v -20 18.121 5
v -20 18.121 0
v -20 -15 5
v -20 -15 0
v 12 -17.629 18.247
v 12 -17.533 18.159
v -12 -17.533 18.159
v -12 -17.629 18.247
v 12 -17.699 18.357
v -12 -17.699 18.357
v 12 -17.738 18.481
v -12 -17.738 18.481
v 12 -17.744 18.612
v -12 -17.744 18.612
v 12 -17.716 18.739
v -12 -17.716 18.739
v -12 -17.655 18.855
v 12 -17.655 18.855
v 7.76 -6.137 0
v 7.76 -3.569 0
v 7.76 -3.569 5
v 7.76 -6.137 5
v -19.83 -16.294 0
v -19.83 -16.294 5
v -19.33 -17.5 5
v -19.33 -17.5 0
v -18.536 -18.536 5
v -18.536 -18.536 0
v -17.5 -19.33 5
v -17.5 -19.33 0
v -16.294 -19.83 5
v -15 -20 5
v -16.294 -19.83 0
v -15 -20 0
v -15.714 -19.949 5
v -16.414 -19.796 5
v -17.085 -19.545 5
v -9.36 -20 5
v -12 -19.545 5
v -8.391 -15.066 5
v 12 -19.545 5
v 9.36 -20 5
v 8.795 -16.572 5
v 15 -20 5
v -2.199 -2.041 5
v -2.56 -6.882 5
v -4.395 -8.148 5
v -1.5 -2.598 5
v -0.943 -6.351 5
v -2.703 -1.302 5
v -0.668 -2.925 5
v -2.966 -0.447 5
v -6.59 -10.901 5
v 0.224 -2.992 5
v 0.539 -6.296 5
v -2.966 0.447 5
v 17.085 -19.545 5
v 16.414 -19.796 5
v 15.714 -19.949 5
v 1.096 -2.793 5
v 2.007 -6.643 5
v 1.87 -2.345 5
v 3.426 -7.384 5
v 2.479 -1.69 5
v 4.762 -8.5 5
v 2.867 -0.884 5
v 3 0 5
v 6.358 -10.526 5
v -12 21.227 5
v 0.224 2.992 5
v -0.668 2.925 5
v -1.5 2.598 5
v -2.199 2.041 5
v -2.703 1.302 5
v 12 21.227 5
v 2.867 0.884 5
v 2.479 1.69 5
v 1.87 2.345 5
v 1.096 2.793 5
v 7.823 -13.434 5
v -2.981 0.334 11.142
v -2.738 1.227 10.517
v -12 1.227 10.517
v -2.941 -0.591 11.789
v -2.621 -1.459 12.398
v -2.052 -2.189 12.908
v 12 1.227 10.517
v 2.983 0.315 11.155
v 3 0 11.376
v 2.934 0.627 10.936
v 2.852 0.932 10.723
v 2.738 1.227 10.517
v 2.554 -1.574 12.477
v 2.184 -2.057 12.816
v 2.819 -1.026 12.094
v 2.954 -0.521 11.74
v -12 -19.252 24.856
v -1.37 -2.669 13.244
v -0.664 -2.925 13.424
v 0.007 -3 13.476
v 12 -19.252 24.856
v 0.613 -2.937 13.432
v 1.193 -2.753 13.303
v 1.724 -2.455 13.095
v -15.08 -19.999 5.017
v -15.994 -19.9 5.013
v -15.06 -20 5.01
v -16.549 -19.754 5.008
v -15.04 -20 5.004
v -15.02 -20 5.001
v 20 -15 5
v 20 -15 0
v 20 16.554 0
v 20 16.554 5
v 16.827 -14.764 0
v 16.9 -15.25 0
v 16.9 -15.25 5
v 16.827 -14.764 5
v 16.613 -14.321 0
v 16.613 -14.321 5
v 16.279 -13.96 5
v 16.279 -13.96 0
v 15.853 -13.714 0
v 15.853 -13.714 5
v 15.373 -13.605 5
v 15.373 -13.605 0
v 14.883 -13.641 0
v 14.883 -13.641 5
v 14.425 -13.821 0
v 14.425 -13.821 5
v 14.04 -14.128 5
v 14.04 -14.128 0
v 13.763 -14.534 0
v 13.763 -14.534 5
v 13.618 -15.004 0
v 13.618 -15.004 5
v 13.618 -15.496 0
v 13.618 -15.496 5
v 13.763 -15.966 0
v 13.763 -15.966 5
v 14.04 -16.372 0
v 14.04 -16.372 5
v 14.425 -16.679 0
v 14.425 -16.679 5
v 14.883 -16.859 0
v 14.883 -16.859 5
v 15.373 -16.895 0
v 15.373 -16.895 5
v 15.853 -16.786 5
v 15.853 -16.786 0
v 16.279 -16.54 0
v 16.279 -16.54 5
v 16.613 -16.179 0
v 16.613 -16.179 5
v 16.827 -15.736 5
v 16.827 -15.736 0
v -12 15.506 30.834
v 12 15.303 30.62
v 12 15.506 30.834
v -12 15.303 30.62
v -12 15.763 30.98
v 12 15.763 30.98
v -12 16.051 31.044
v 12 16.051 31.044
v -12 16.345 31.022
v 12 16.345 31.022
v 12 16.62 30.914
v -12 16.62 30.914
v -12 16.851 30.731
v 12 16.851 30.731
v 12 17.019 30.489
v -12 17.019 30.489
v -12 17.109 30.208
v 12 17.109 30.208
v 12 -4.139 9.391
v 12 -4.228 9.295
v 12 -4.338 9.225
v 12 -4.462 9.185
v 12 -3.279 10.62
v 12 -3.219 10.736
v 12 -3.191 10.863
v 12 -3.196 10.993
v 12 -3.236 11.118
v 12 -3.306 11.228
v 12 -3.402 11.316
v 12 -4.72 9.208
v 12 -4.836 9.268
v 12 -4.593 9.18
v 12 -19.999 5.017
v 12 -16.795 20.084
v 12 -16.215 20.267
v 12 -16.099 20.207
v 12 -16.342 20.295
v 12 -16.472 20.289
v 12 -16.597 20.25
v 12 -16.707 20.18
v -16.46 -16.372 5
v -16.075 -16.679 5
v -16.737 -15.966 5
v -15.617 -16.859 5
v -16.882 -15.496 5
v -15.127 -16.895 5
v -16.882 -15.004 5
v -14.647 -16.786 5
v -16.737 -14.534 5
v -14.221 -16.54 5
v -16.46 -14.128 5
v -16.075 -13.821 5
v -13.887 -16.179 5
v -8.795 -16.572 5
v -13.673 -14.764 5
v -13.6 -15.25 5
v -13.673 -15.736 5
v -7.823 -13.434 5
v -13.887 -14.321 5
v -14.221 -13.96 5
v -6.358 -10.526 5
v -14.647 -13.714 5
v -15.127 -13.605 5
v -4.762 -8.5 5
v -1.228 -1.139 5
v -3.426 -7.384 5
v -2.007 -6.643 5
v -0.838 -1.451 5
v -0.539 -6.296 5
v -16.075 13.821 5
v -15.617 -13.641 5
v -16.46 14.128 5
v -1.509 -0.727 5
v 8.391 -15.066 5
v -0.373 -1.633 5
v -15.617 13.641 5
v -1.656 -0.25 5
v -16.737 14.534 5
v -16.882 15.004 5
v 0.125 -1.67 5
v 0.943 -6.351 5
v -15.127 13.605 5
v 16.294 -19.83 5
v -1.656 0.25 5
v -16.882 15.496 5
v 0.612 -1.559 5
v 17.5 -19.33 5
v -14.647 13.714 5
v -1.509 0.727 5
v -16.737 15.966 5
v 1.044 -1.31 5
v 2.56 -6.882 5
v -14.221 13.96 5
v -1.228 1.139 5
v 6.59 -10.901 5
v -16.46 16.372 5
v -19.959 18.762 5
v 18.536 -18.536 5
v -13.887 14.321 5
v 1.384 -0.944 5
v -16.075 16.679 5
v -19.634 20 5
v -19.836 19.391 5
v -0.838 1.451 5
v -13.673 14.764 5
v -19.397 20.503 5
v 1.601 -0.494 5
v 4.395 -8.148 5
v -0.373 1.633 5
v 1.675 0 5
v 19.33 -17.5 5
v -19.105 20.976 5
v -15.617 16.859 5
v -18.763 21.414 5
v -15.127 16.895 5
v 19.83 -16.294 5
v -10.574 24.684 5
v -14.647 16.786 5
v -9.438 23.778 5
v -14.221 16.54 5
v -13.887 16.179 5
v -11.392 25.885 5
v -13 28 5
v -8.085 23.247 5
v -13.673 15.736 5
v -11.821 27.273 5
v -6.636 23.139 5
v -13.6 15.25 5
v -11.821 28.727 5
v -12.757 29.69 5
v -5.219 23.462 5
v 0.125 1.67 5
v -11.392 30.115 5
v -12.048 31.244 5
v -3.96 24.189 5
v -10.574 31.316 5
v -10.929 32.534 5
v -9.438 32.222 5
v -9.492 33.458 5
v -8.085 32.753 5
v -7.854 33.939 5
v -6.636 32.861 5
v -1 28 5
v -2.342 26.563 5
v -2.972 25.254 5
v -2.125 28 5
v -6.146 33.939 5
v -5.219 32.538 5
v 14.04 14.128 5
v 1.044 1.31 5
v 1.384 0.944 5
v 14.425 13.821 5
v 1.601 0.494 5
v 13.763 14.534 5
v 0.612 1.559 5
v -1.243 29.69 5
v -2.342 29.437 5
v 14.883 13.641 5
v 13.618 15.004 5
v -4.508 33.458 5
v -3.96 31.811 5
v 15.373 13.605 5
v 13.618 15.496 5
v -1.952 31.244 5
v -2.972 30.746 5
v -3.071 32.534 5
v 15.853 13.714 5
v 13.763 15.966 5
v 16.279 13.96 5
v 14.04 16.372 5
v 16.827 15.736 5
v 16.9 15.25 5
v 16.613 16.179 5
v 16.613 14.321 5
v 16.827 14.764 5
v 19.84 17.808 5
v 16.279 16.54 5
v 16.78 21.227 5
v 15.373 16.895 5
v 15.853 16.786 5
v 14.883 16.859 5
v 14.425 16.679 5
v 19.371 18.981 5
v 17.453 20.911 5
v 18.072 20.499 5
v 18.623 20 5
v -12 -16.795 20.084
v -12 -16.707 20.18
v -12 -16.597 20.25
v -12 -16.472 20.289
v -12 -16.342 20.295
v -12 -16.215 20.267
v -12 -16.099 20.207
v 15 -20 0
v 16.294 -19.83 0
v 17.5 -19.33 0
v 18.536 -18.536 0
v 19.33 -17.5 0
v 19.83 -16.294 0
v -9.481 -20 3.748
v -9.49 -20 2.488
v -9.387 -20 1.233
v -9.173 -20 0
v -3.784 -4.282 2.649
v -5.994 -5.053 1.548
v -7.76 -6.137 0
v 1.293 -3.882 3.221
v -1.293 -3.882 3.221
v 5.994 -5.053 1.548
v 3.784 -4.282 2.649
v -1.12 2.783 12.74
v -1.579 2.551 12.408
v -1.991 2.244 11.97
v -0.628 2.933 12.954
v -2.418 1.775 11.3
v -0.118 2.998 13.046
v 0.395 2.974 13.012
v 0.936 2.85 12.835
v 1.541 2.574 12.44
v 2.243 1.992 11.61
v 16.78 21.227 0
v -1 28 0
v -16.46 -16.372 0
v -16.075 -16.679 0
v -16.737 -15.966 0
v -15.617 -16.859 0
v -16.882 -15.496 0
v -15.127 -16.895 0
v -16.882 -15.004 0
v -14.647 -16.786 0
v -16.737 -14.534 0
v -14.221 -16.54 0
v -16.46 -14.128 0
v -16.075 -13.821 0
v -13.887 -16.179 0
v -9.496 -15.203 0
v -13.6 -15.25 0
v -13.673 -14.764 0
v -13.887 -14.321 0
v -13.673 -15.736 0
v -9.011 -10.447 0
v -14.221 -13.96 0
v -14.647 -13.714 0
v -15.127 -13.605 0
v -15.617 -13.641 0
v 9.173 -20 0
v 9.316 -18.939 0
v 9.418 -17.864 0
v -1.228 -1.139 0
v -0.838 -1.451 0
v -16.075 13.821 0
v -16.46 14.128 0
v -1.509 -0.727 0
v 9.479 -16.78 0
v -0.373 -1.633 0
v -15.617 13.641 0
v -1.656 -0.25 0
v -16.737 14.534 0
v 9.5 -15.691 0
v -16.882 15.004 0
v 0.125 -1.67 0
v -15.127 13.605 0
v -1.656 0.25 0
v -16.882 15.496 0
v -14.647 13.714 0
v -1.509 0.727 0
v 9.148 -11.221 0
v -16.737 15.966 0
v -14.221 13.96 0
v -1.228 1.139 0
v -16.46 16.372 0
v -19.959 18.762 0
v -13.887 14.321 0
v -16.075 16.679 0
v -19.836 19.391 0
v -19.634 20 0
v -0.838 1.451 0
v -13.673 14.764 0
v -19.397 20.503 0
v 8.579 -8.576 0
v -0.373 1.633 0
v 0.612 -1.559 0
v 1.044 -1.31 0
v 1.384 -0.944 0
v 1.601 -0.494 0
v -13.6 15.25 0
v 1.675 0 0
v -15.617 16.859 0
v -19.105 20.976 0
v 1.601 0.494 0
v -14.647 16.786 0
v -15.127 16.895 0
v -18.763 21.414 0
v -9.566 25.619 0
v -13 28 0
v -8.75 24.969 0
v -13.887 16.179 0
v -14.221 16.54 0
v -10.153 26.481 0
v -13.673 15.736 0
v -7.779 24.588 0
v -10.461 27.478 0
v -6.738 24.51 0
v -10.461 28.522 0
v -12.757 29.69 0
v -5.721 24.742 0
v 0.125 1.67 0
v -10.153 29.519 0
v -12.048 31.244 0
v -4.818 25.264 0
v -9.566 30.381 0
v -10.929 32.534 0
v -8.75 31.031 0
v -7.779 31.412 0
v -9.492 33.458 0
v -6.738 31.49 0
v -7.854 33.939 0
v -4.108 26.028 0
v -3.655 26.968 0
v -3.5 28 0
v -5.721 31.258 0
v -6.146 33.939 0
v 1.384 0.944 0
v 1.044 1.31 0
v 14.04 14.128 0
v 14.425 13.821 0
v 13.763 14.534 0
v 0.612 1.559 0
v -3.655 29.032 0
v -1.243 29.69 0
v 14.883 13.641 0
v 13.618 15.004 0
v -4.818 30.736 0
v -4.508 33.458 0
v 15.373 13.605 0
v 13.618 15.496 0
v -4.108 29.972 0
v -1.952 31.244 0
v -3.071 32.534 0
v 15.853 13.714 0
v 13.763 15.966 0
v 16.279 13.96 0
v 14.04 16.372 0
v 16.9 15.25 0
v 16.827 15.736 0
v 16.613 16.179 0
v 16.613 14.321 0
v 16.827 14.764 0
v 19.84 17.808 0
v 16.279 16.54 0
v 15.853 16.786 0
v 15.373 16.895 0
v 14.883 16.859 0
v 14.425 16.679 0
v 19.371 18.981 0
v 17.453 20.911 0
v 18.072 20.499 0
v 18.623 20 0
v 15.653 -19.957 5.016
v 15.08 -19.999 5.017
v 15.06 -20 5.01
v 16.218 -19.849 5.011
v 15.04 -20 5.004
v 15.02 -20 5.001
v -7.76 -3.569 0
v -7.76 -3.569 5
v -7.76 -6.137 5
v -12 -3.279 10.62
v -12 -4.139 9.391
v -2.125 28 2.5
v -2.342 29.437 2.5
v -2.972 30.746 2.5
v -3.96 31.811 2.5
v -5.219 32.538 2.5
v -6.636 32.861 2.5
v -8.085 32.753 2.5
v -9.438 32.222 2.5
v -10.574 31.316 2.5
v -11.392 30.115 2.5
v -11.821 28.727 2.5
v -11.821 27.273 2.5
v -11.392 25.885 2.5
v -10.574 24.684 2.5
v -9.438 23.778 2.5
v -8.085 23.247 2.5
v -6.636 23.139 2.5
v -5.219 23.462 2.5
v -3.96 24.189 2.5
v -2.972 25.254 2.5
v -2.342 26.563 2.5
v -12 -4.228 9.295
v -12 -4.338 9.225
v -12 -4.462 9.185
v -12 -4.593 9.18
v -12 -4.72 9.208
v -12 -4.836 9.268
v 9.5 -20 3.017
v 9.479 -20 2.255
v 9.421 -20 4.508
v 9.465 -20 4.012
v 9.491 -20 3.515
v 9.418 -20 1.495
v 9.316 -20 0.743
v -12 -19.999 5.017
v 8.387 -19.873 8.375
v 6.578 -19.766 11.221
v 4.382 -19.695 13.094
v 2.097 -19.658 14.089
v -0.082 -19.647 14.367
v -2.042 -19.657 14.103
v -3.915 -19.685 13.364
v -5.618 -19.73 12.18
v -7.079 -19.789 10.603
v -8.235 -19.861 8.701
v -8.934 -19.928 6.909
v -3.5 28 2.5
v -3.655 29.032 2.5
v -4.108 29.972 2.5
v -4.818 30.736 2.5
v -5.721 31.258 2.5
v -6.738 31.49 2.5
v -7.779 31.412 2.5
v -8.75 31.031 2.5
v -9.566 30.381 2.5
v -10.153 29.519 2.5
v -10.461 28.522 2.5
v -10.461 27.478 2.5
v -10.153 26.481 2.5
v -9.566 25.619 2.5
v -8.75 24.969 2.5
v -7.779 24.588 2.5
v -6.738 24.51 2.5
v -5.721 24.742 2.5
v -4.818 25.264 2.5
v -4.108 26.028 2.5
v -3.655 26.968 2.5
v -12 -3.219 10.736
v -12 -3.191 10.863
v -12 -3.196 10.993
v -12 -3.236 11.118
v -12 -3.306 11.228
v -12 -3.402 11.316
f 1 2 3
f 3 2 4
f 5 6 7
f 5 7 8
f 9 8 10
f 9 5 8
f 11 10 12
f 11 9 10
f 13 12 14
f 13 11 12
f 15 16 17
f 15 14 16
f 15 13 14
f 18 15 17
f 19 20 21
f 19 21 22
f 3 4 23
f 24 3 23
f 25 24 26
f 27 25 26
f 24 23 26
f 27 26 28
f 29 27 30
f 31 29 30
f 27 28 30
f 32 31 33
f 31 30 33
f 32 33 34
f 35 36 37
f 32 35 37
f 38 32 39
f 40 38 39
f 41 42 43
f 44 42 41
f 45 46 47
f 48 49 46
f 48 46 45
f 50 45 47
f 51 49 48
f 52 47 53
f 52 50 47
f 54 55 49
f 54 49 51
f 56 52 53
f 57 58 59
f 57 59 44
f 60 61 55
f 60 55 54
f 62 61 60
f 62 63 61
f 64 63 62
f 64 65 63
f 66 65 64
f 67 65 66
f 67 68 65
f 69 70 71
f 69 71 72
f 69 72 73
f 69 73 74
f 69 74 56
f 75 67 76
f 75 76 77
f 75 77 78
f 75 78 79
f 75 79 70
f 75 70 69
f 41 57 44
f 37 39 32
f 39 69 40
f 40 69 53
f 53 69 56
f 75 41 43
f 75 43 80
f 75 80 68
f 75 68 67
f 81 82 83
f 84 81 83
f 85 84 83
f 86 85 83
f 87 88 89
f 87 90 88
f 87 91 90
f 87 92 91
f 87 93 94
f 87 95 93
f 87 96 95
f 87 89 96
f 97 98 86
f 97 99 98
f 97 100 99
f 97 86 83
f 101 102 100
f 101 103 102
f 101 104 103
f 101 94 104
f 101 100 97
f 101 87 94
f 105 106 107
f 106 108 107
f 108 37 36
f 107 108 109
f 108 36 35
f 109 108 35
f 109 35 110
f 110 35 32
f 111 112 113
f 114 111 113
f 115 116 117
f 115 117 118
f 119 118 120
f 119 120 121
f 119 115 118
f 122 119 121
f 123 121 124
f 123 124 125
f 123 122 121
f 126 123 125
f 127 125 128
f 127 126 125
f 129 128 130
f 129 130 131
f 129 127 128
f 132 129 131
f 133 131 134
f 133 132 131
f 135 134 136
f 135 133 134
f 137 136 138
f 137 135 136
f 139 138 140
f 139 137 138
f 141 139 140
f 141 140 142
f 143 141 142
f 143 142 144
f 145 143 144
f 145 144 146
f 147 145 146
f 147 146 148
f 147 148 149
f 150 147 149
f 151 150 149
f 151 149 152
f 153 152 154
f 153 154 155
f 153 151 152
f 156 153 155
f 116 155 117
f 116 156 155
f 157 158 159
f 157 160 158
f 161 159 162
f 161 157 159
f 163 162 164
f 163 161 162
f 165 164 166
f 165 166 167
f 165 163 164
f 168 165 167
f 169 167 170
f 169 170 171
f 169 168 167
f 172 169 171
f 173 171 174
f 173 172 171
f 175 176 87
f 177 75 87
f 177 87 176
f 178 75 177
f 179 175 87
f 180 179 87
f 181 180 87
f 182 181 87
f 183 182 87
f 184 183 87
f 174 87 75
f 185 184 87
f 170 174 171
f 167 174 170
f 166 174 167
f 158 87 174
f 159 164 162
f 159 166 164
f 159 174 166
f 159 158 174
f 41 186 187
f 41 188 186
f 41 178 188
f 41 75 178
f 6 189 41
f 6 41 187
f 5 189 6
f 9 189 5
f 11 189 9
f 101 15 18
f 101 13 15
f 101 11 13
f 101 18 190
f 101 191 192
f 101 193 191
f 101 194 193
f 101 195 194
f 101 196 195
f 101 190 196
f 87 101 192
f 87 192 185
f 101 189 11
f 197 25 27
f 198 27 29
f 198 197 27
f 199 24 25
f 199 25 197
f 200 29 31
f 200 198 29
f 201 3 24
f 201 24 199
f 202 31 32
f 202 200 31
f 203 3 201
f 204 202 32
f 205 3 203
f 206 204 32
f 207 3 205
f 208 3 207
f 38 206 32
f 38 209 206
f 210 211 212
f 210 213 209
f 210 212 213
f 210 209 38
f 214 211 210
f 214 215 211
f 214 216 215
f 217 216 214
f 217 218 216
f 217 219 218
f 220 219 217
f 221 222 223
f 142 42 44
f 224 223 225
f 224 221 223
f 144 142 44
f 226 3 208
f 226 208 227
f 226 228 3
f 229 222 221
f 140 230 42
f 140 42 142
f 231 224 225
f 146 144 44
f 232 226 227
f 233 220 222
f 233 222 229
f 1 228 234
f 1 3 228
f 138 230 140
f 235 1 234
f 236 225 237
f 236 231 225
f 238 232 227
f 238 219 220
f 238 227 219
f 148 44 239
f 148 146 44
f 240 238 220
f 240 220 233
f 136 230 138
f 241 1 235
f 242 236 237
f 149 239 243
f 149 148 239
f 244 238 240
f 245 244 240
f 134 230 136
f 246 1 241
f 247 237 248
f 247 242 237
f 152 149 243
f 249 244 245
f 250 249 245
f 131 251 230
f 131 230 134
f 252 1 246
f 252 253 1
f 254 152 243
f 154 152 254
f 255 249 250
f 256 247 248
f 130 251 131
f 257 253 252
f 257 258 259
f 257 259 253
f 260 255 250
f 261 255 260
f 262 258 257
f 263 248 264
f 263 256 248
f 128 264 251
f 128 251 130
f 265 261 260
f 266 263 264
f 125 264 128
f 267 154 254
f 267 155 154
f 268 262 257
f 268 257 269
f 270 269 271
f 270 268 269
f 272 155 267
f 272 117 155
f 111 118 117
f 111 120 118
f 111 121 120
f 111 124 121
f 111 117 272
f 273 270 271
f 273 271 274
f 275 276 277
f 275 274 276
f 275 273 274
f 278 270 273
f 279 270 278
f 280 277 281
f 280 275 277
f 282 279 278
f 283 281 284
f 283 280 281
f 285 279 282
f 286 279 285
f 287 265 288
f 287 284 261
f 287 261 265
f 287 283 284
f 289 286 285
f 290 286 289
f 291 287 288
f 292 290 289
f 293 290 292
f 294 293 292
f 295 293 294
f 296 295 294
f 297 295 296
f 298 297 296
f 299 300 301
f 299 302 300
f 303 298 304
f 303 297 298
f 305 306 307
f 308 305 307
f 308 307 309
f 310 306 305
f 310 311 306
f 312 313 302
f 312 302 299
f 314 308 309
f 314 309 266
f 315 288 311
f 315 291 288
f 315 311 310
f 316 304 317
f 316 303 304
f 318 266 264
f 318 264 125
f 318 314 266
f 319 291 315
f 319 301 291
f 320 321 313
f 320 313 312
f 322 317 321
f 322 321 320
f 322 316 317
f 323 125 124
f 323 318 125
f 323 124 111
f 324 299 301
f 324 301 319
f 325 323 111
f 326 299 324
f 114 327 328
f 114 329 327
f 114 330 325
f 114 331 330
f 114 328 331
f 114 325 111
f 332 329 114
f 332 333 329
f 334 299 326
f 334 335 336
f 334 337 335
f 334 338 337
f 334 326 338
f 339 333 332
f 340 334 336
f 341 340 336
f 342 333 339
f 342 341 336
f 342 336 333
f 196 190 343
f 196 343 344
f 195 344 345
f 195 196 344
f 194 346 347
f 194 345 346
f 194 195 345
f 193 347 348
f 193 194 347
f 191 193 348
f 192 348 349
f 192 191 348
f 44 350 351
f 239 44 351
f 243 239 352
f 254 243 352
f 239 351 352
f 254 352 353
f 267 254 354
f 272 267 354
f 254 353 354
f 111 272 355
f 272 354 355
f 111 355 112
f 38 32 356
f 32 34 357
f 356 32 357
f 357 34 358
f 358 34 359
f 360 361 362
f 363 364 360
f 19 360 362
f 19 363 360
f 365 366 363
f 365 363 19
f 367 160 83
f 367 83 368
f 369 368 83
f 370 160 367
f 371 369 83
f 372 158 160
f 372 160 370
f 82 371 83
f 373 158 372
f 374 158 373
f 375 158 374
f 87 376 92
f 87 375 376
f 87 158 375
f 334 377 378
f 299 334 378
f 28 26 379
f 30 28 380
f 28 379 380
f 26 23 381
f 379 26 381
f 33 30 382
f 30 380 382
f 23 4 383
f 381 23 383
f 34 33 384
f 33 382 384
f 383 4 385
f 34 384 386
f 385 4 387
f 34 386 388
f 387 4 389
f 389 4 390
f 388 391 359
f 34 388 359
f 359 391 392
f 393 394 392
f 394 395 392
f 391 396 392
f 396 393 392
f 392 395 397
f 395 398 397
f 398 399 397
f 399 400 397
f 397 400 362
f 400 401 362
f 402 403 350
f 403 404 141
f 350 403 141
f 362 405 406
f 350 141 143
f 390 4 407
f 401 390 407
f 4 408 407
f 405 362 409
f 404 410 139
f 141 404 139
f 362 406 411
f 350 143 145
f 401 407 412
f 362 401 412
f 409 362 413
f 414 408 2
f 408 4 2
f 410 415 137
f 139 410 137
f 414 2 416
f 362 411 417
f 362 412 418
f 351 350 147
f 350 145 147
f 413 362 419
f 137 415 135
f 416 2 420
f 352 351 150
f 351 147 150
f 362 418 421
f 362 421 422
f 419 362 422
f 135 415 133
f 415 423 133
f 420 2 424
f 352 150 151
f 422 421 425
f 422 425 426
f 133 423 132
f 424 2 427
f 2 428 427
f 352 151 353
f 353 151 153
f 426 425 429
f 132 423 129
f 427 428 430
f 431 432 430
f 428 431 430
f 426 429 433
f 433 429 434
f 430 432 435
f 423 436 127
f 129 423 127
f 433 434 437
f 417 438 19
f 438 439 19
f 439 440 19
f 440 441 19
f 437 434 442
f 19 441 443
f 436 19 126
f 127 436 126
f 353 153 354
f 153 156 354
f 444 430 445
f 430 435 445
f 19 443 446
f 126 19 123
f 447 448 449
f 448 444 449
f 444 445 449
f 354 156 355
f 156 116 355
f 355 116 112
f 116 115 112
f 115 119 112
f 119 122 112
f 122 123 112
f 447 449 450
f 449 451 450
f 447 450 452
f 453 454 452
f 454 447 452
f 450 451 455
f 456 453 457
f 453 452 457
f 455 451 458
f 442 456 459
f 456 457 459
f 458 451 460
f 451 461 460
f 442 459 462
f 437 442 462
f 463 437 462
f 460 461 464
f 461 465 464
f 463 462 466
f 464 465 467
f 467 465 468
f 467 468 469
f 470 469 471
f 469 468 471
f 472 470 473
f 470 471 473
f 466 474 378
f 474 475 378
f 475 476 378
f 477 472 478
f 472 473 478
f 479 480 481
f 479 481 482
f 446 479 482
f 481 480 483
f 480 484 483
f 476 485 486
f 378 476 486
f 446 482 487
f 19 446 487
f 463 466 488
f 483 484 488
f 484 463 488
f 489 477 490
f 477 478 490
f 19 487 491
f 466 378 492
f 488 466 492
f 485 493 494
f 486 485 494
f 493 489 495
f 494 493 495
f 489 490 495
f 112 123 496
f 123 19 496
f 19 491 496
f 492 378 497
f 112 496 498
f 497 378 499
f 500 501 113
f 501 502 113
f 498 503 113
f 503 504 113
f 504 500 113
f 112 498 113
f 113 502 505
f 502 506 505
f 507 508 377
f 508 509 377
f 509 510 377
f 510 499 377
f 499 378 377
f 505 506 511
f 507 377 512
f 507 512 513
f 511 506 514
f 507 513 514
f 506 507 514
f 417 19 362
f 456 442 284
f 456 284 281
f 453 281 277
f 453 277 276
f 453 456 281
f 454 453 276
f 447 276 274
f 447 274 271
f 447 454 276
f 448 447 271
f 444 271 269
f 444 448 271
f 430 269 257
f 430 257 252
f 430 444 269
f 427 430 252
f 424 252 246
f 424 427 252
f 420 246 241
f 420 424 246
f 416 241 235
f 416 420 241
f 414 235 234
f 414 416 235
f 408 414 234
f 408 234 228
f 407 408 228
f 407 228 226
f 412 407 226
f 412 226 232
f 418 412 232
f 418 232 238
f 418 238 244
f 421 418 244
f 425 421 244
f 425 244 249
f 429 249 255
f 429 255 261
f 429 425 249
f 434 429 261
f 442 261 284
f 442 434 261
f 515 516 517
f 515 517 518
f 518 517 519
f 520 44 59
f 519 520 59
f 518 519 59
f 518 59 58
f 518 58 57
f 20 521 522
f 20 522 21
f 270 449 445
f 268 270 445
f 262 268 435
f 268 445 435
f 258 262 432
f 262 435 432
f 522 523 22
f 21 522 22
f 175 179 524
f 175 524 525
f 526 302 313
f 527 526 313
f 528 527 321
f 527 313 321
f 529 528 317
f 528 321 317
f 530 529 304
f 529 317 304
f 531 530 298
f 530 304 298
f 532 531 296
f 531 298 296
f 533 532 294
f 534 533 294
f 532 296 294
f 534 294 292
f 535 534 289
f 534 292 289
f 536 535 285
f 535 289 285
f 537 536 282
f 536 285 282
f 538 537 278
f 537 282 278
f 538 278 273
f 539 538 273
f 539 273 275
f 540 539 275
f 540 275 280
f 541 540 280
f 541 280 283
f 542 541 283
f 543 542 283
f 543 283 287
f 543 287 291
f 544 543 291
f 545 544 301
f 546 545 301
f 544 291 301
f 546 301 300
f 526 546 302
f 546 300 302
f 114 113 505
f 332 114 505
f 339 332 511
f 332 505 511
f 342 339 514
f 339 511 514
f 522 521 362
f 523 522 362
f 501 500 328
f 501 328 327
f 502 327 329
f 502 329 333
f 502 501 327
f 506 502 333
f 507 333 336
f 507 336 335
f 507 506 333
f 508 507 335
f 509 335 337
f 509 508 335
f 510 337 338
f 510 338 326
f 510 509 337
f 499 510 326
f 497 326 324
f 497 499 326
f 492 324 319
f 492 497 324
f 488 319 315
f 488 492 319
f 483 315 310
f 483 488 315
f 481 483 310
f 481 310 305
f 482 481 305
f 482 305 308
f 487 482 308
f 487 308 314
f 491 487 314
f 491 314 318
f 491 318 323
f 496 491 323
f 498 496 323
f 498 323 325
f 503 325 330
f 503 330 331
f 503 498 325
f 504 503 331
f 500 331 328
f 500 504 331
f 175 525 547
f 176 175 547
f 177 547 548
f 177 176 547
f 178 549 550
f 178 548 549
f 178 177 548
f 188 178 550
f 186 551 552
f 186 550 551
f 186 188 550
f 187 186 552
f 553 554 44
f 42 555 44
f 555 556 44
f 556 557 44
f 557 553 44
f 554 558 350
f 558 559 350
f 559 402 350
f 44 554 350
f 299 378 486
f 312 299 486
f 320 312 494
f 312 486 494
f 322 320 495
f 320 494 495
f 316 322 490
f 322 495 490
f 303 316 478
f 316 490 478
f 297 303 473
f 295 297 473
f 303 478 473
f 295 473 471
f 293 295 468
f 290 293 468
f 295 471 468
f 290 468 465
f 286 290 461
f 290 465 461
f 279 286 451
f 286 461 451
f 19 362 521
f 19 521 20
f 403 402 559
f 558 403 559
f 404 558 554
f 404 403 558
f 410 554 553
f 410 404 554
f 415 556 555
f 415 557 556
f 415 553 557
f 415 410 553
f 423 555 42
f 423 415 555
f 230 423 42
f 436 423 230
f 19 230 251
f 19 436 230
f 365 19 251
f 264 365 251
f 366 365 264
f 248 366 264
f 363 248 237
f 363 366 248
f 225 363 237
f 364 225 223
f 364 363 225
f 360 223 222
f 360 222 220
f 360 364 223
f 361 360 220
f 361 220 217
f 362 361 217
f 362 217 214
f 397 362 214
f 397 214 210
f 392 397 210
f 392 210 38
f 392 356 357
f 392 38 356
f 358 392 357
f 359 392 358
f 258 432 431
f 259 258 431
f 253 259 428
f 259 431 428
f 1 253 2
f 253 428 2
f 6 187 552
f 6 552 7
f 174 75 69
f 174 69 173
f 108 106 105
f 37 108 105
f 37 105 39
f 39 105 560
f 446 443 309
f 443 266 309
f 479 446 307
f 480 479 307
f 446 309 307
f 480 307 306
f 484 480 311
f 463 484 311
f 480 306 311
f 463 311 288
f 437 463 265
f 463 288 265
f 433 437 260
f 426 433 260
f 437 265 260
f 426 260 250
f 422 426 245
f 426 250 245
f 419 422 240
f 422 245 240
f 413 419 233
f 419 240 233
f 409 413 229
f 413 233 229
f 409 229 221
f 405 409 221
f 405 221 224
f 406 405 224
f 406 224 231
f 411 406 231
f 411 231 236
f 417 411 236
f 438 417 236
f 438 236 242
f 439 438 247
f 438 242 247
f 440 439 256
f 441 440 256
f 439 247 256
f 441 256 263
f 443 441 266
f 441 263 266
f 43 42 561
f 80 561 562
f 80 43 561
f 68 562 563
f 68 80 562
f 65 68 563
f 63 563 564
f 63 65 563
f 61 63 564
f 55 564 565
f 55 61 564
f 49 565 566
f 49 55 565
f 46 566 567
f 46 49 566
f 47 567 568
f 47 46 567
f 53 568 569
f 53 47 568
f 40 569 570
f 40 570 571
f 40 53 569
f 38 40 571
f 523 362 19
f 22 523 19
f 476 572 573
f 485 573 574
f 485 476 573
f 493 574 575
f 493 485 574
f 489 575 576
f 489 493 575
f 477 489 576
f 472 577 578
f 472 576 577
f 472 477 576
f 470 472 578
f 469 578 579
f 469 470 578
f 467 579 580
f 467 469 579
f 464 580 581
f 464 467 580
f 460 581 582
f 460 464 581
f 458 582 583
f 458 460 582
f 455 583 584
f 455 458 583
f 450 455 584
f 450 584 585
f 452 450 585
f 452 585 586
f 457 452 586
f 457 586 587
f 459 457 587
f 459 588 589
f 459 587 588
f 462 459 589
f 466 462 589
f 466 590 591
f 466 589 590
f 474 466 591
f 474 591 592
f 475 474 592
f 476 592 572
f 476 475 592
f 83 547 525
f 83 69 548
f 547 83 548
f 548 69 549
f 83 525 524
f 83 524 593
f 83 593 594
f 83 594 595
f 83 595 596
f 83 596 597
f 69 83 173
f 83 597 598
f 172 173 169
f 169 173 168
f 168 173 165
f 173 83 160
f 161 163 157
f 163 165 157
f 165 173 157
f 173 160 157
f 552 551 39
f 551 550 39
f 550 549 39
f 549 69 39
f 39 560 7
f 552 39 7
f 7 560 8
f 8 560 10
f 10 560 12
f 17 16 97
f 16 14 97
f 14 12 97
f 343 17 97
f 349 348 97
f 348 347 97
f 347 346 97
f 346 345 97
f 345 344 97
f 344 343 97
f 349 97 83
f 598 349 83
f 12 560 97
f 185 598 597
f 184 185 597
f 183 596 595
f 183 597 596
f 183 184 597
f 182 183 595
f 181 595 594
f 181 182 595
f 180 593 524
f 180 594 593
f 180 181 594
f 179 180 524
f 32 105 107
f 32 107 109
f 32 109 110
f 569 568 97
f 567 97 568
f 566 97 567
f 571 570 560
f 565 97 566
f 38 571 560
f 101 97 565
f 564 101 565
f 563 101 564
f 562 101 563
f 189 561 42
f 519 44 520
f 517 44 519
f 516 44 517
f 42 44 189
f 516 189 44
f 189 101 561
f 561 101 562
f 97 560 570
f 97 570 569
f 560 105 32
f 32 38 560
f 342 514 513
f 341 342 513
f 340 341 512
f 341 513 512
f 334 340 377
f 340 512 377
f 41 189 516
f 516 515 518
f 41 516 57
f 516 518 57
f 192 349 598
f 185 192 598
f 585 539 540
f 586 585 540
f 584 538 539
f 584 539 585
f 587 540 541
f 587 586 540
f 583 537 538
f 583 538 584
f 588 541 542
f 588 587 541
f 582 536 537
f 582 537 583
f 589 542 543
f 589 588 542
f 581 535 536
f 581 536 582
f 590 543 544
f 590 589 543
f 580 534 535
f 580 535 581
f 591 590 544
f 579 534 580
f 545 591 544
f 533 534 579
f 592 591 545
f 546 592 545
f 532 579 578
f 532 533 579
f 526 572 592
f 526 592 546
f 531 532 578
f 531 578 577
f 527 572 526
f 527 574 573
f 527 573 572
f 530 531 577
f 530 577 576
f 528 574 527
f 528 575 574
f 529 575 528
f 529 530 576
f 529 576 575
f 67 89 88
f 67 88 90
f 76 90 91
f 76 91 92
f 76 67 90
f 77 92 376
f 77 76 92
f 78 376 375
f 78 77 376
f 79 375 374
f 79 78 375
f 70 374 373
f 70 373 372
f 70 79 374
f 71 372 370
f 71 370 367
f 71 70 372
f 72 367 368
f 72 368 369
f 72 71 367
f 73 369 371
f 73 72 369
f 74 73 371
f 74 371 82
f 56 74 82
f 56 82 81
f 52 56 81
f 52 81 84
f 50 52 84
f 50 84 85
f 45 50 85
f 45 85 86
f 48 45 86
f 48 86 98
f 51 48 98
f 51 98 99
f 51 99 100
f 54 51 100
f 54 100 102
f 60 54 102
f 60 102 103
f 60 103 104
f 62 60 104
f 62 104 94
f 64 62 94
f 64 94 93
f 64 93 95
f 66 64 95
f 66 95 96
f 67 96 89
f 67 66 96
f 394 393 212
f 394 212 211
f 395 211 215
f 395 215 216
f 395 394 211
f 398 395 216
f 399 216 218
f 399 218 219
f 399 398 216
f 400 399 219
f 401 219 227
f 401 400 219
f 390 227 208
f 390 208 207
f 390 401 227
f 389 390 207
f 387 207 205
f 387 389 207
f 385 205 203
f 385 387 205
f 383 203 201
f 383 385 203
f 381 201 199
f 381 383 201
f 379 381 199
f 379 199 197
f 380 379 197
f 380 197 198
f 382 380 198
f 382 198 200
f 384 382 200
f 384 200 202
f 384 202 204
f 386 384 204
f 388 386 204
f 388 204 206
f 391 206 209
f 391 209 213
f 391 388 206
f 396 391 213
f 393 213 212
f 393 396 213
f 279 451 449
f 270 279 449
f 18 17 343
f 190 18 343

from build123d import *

# Parameters (mm, degrees)
F0_R          = 1.65
F0_R_2        = 3.5
F1_DEPTH      = 5
F3_DEPTH      = 40
F4_R          = 9.5
F5_DEPTH      = 25
F6_R          = 1.675
F7_DEPTH      = 25
F7_DEPTH_BACK = 25
F8_R          = 3
F9_DEPTH      = 40
F11_DEPTH     = 40
F12_W         = 9.1582505405
F12_H         = 40
F12_W_2       = 8.5622543842
F13_DEPTH     = 50
F14_R         = 1
F15_R         = 4.875
F16_DEPTH     = 2.5
F17_W         = 15.5204893433
F17_H         = 2.5680447786
F18_DEPTH     = 5


with BuildPart() as f1:
    # F0 (on Top) → F1 (new body)
    with BuildSketch(Plane.XY):
        with BuildLine():
            Line((-15, -20), (15, -20))
            ThreePointArc((15, -20), (18.5355339059, -18.5355339059), (20, -15))
            Line((20, -15), (20, 16.5542368918))
            ThreePointArc((20, 16.5542368918), (19.643027324, 18.4095797898), (18.6230810925, 20))
            Line((18.6230810925, 20), (-19.6336355125, 20))
            ThreePointArc((-19.6336355125, 20), (-19.9075542566, 19.078356926), (-20, 18.1213244195))
            Line((-20, 18.1213244195), (-20, -15))
            ThreePointArc((-20, -15), (-18.5355339059, -18.5355339059), (-15, -20))
        make_face()
        with Locations((-15.25, -15.25)):
            Circle(F0_R, mode=Mode.SUBTRACT)
        with Locations((15.25, -15.25)):
            Circle(F0_R, mode=Mode.SUBTRACT)
        with Locations((-15.25, 15.25)):
            Circle(F0_R, mode=Mode.SUBTRACT)
        with Locations((15.25, 15.25)):
            Circle(F0_R, mode=Mode.SUBTRACT)
        with BuildLine():
            Line((-19.6336355125, 20), (18.6230810925, 20))
            ThreePointArc((18.6230810925, 20), (17.7702782254, 20.7166350653), (16.779976638, 21.2266755665))
            Line((16.779976638, 21.2266755665), (-1, 28))
            ThreePointArc((-1, 28), (-7, 22), (-13, 28))
            Line((-13, 28), (-18.7628834735, 21.4138474588))
            ThreePointArc((-18.7628834735, 21.4138474588), (-19.2573611463, 20.7433229072), (-19.6336355125, 20))
        make_face()
        with BuildLine():
            ThreePointArc((-13, 28), (-7, 22), (-1, 28))
            ThreePointArc((-1, 28), (-7, 34), (-13, 28))
        make_face()
        with Locations((-7, 28)):
            Circle(F0_R_2, mode=Mode.SUBTRACT)
    extrude(amount=F1_DEPTH)


with BuildPart() as f3:
    # F2 (on face) → F3 (new body)
    with BuildSketch(Plane.YZ.offset(20)):
        Polygon((1.2266755665, 10.51673083), (-19.2521255407, 24.8561417388), (-20, 5), (21.2266755665, 5), (16.713239348, 32.6338360258), align=None)
        with BuildLine():
            ThreePointArc((-16.7950944212, 20.0837735554), (-16.4723424879, 20.2893892137), (-16.0987301809, 20.2065613594))
            Line((-16.0987301809, 20.2065613594), (-3.4018734944, 11.3161265959))
            ThreePointArc((-3.4018734944, 11.3161265959), (-3.1962578361, 10.9933746626), (-3.2790856905, 10.6197623556))
            Line((-3.2790856905, 10.6197623556), (-4.139450345, 9.3910342892))
            ThreePointArc((-4.139450345, 9.3910342892), (-4.4622022783, 9.1854186308), (-4.8358145853, 9.2682464852))
            Line((-4.8358145853, 9.2682464852), (-17.5326712718, 18.1586812486))
            ThreePointArc((-17.5326712718, 18.1586812486), (-17.7382869301, 18.481433182), (-17.6554590758, 18.855045489))
            Line((-17.6554590758, 18.855045489), (-16.7950944212, 20.0837735554))
        make_face(mode=Mode.SUBTRACT)
    extrude(amount=-F3_DEPTH)


with BuildPart() as f5_tool:
    # F4 (on face) → F5 (new body)
    with BuildSketch(Plane(origin=(0, -4.1181355181, 2.8835495331), x_dir=(1, 0, 0), z_dir=(0, -0.8191520443, 0.5735764364))):
        with Locations((0, -9)):
            Circle(F4_R)
    extrude(amount=F5_DEPTH)


with BuildPart() as f1_1:
    add(f1.part)

    # F5: cut by f5_tool
    add(f5_tool.part, mode=Mode.SUBTRACT)


with BuildPart() as f3_1:
    add(f3.part)

    # F5: cut by f5_tool
    add(f5_tool.part, mode=Mode.SUBTRACT)


with BuildPart() as f7_tool:
    # F6 (on face) → F7 (new body, two sides)
    with BuildSketch(Plane.XY.offset(5)) as f7_sk:
        Circle(F6_R)
    extrude(amount=F7_DEPTH)
    extrude(f7_sk.sketch, amount=-F7_DEPTH_BACK)


with BuildPart() as f1_2:
    add(f1_1.part)

    # F7: cut by f7_tool
    add(f7_tool.part, mode=Mode.SUBTRACT)

    # F15 (on face) → F16 (cut)
    with BuildSketch(Plane.XY.offset(5)):
        with Locations((-7, 28)):
            Circle(F15_R)
    extrude(amount=-F16_DEPTH, mode=Mode.SUBTRACT)


with BuildPart() as f3_2:
    add(f3_1.part)

    # F7: cut by f7_tool
    add(f7_tool.part, mode=Mode.SUBTRACT)

    # F8 (on face) → F9 (cut)
    with BuildSketch(Plane.XY.offset(5)):
        with Locations((-15.25, -15.25)):
            Circle(F8_R)
        with Locations((-15.25, 15.25)):
            Circle(F8_R)
        with Locations((15.25, 15.25)):
            Circle(F8_R)
        with Locations((15.25, -15.25)):
            Circle(F8_R)
        Circle(F8_R)
    extrude(amount=F9_DEPTH, mode=Mode.SUBTRACT)

    # F10 (on face) → F11 (cut)
    with BuildSketch(Plane(origin=(0, 0, 0), x_dir=(1, 0, 0), z_dir=(0, 0, -1))):
        with BuildLine():
            ThreePointArc((-20, 15), (-18.5355339059, 18.5355339059), (-15, 20))
            Line((-15, 20), (-18.4092409909, 22.2686175257))
            Line((-18.4092409909, 22.2686175257), (-22.4427245557, 20.613854751))
            Line((-22.4427245557, 20.613854751), (-20, 15))
        make_face()
        with BuildLine():
            Line((15.3065547347, 23.8199587911), (15, 20))
            ThreePointArc((15, 20), (18.5355339059, 18.5355339059), (20, 15))
            Line((20, 15), (20, 23.8199587911))
            Line((20, 23.8199587911), (15.3065547347, 23.8199587911))
        make_face()
    extrude(amount=-F11_DEPTH, mode=Mode.SUBTRACT)

    # F12 (on face) → F13 (cut)
    with BuildSketch(Plane(origin=(0, -20.1597241143, 0.7593087806), x_dir=(1, 0, 0), z_dir=(0, -0.9992914412, 0.0376379538))):
        with Locations((16.5791252702, 24.2608358153)):
            Rectangle(F12_W, F12_H)
        with Locations((-16.2811271921, 24.2608358153)):
            Rectangle(F12_W_2, F12_H)
    extrude(amount=-F13_DEPTH, mode=Mode.SUBTRACT)

    # F14
    f14_edges = [f3_2.edges().sort_by_distance(p)[0] for p in [
        (0, 16.713239, 32.633836),
    ]]
    fillet(f14_edges, radius=F14_R)


with BuildPart() as f18:
    # F17 (on face) → F18 (new body)
    with BuildSketch(Plane(origin=(0, 0, 0), x_dir=(1, 0, 0), z_dir=(0, 0, -1))):
        with Locations((0, 4.8531962487)):
            Rectangle(F17_W, F17_H)
    extrude(amount=-F18_DEPTH)


solid = Compound([f1_2.part, f3_2.part, f18.part])
